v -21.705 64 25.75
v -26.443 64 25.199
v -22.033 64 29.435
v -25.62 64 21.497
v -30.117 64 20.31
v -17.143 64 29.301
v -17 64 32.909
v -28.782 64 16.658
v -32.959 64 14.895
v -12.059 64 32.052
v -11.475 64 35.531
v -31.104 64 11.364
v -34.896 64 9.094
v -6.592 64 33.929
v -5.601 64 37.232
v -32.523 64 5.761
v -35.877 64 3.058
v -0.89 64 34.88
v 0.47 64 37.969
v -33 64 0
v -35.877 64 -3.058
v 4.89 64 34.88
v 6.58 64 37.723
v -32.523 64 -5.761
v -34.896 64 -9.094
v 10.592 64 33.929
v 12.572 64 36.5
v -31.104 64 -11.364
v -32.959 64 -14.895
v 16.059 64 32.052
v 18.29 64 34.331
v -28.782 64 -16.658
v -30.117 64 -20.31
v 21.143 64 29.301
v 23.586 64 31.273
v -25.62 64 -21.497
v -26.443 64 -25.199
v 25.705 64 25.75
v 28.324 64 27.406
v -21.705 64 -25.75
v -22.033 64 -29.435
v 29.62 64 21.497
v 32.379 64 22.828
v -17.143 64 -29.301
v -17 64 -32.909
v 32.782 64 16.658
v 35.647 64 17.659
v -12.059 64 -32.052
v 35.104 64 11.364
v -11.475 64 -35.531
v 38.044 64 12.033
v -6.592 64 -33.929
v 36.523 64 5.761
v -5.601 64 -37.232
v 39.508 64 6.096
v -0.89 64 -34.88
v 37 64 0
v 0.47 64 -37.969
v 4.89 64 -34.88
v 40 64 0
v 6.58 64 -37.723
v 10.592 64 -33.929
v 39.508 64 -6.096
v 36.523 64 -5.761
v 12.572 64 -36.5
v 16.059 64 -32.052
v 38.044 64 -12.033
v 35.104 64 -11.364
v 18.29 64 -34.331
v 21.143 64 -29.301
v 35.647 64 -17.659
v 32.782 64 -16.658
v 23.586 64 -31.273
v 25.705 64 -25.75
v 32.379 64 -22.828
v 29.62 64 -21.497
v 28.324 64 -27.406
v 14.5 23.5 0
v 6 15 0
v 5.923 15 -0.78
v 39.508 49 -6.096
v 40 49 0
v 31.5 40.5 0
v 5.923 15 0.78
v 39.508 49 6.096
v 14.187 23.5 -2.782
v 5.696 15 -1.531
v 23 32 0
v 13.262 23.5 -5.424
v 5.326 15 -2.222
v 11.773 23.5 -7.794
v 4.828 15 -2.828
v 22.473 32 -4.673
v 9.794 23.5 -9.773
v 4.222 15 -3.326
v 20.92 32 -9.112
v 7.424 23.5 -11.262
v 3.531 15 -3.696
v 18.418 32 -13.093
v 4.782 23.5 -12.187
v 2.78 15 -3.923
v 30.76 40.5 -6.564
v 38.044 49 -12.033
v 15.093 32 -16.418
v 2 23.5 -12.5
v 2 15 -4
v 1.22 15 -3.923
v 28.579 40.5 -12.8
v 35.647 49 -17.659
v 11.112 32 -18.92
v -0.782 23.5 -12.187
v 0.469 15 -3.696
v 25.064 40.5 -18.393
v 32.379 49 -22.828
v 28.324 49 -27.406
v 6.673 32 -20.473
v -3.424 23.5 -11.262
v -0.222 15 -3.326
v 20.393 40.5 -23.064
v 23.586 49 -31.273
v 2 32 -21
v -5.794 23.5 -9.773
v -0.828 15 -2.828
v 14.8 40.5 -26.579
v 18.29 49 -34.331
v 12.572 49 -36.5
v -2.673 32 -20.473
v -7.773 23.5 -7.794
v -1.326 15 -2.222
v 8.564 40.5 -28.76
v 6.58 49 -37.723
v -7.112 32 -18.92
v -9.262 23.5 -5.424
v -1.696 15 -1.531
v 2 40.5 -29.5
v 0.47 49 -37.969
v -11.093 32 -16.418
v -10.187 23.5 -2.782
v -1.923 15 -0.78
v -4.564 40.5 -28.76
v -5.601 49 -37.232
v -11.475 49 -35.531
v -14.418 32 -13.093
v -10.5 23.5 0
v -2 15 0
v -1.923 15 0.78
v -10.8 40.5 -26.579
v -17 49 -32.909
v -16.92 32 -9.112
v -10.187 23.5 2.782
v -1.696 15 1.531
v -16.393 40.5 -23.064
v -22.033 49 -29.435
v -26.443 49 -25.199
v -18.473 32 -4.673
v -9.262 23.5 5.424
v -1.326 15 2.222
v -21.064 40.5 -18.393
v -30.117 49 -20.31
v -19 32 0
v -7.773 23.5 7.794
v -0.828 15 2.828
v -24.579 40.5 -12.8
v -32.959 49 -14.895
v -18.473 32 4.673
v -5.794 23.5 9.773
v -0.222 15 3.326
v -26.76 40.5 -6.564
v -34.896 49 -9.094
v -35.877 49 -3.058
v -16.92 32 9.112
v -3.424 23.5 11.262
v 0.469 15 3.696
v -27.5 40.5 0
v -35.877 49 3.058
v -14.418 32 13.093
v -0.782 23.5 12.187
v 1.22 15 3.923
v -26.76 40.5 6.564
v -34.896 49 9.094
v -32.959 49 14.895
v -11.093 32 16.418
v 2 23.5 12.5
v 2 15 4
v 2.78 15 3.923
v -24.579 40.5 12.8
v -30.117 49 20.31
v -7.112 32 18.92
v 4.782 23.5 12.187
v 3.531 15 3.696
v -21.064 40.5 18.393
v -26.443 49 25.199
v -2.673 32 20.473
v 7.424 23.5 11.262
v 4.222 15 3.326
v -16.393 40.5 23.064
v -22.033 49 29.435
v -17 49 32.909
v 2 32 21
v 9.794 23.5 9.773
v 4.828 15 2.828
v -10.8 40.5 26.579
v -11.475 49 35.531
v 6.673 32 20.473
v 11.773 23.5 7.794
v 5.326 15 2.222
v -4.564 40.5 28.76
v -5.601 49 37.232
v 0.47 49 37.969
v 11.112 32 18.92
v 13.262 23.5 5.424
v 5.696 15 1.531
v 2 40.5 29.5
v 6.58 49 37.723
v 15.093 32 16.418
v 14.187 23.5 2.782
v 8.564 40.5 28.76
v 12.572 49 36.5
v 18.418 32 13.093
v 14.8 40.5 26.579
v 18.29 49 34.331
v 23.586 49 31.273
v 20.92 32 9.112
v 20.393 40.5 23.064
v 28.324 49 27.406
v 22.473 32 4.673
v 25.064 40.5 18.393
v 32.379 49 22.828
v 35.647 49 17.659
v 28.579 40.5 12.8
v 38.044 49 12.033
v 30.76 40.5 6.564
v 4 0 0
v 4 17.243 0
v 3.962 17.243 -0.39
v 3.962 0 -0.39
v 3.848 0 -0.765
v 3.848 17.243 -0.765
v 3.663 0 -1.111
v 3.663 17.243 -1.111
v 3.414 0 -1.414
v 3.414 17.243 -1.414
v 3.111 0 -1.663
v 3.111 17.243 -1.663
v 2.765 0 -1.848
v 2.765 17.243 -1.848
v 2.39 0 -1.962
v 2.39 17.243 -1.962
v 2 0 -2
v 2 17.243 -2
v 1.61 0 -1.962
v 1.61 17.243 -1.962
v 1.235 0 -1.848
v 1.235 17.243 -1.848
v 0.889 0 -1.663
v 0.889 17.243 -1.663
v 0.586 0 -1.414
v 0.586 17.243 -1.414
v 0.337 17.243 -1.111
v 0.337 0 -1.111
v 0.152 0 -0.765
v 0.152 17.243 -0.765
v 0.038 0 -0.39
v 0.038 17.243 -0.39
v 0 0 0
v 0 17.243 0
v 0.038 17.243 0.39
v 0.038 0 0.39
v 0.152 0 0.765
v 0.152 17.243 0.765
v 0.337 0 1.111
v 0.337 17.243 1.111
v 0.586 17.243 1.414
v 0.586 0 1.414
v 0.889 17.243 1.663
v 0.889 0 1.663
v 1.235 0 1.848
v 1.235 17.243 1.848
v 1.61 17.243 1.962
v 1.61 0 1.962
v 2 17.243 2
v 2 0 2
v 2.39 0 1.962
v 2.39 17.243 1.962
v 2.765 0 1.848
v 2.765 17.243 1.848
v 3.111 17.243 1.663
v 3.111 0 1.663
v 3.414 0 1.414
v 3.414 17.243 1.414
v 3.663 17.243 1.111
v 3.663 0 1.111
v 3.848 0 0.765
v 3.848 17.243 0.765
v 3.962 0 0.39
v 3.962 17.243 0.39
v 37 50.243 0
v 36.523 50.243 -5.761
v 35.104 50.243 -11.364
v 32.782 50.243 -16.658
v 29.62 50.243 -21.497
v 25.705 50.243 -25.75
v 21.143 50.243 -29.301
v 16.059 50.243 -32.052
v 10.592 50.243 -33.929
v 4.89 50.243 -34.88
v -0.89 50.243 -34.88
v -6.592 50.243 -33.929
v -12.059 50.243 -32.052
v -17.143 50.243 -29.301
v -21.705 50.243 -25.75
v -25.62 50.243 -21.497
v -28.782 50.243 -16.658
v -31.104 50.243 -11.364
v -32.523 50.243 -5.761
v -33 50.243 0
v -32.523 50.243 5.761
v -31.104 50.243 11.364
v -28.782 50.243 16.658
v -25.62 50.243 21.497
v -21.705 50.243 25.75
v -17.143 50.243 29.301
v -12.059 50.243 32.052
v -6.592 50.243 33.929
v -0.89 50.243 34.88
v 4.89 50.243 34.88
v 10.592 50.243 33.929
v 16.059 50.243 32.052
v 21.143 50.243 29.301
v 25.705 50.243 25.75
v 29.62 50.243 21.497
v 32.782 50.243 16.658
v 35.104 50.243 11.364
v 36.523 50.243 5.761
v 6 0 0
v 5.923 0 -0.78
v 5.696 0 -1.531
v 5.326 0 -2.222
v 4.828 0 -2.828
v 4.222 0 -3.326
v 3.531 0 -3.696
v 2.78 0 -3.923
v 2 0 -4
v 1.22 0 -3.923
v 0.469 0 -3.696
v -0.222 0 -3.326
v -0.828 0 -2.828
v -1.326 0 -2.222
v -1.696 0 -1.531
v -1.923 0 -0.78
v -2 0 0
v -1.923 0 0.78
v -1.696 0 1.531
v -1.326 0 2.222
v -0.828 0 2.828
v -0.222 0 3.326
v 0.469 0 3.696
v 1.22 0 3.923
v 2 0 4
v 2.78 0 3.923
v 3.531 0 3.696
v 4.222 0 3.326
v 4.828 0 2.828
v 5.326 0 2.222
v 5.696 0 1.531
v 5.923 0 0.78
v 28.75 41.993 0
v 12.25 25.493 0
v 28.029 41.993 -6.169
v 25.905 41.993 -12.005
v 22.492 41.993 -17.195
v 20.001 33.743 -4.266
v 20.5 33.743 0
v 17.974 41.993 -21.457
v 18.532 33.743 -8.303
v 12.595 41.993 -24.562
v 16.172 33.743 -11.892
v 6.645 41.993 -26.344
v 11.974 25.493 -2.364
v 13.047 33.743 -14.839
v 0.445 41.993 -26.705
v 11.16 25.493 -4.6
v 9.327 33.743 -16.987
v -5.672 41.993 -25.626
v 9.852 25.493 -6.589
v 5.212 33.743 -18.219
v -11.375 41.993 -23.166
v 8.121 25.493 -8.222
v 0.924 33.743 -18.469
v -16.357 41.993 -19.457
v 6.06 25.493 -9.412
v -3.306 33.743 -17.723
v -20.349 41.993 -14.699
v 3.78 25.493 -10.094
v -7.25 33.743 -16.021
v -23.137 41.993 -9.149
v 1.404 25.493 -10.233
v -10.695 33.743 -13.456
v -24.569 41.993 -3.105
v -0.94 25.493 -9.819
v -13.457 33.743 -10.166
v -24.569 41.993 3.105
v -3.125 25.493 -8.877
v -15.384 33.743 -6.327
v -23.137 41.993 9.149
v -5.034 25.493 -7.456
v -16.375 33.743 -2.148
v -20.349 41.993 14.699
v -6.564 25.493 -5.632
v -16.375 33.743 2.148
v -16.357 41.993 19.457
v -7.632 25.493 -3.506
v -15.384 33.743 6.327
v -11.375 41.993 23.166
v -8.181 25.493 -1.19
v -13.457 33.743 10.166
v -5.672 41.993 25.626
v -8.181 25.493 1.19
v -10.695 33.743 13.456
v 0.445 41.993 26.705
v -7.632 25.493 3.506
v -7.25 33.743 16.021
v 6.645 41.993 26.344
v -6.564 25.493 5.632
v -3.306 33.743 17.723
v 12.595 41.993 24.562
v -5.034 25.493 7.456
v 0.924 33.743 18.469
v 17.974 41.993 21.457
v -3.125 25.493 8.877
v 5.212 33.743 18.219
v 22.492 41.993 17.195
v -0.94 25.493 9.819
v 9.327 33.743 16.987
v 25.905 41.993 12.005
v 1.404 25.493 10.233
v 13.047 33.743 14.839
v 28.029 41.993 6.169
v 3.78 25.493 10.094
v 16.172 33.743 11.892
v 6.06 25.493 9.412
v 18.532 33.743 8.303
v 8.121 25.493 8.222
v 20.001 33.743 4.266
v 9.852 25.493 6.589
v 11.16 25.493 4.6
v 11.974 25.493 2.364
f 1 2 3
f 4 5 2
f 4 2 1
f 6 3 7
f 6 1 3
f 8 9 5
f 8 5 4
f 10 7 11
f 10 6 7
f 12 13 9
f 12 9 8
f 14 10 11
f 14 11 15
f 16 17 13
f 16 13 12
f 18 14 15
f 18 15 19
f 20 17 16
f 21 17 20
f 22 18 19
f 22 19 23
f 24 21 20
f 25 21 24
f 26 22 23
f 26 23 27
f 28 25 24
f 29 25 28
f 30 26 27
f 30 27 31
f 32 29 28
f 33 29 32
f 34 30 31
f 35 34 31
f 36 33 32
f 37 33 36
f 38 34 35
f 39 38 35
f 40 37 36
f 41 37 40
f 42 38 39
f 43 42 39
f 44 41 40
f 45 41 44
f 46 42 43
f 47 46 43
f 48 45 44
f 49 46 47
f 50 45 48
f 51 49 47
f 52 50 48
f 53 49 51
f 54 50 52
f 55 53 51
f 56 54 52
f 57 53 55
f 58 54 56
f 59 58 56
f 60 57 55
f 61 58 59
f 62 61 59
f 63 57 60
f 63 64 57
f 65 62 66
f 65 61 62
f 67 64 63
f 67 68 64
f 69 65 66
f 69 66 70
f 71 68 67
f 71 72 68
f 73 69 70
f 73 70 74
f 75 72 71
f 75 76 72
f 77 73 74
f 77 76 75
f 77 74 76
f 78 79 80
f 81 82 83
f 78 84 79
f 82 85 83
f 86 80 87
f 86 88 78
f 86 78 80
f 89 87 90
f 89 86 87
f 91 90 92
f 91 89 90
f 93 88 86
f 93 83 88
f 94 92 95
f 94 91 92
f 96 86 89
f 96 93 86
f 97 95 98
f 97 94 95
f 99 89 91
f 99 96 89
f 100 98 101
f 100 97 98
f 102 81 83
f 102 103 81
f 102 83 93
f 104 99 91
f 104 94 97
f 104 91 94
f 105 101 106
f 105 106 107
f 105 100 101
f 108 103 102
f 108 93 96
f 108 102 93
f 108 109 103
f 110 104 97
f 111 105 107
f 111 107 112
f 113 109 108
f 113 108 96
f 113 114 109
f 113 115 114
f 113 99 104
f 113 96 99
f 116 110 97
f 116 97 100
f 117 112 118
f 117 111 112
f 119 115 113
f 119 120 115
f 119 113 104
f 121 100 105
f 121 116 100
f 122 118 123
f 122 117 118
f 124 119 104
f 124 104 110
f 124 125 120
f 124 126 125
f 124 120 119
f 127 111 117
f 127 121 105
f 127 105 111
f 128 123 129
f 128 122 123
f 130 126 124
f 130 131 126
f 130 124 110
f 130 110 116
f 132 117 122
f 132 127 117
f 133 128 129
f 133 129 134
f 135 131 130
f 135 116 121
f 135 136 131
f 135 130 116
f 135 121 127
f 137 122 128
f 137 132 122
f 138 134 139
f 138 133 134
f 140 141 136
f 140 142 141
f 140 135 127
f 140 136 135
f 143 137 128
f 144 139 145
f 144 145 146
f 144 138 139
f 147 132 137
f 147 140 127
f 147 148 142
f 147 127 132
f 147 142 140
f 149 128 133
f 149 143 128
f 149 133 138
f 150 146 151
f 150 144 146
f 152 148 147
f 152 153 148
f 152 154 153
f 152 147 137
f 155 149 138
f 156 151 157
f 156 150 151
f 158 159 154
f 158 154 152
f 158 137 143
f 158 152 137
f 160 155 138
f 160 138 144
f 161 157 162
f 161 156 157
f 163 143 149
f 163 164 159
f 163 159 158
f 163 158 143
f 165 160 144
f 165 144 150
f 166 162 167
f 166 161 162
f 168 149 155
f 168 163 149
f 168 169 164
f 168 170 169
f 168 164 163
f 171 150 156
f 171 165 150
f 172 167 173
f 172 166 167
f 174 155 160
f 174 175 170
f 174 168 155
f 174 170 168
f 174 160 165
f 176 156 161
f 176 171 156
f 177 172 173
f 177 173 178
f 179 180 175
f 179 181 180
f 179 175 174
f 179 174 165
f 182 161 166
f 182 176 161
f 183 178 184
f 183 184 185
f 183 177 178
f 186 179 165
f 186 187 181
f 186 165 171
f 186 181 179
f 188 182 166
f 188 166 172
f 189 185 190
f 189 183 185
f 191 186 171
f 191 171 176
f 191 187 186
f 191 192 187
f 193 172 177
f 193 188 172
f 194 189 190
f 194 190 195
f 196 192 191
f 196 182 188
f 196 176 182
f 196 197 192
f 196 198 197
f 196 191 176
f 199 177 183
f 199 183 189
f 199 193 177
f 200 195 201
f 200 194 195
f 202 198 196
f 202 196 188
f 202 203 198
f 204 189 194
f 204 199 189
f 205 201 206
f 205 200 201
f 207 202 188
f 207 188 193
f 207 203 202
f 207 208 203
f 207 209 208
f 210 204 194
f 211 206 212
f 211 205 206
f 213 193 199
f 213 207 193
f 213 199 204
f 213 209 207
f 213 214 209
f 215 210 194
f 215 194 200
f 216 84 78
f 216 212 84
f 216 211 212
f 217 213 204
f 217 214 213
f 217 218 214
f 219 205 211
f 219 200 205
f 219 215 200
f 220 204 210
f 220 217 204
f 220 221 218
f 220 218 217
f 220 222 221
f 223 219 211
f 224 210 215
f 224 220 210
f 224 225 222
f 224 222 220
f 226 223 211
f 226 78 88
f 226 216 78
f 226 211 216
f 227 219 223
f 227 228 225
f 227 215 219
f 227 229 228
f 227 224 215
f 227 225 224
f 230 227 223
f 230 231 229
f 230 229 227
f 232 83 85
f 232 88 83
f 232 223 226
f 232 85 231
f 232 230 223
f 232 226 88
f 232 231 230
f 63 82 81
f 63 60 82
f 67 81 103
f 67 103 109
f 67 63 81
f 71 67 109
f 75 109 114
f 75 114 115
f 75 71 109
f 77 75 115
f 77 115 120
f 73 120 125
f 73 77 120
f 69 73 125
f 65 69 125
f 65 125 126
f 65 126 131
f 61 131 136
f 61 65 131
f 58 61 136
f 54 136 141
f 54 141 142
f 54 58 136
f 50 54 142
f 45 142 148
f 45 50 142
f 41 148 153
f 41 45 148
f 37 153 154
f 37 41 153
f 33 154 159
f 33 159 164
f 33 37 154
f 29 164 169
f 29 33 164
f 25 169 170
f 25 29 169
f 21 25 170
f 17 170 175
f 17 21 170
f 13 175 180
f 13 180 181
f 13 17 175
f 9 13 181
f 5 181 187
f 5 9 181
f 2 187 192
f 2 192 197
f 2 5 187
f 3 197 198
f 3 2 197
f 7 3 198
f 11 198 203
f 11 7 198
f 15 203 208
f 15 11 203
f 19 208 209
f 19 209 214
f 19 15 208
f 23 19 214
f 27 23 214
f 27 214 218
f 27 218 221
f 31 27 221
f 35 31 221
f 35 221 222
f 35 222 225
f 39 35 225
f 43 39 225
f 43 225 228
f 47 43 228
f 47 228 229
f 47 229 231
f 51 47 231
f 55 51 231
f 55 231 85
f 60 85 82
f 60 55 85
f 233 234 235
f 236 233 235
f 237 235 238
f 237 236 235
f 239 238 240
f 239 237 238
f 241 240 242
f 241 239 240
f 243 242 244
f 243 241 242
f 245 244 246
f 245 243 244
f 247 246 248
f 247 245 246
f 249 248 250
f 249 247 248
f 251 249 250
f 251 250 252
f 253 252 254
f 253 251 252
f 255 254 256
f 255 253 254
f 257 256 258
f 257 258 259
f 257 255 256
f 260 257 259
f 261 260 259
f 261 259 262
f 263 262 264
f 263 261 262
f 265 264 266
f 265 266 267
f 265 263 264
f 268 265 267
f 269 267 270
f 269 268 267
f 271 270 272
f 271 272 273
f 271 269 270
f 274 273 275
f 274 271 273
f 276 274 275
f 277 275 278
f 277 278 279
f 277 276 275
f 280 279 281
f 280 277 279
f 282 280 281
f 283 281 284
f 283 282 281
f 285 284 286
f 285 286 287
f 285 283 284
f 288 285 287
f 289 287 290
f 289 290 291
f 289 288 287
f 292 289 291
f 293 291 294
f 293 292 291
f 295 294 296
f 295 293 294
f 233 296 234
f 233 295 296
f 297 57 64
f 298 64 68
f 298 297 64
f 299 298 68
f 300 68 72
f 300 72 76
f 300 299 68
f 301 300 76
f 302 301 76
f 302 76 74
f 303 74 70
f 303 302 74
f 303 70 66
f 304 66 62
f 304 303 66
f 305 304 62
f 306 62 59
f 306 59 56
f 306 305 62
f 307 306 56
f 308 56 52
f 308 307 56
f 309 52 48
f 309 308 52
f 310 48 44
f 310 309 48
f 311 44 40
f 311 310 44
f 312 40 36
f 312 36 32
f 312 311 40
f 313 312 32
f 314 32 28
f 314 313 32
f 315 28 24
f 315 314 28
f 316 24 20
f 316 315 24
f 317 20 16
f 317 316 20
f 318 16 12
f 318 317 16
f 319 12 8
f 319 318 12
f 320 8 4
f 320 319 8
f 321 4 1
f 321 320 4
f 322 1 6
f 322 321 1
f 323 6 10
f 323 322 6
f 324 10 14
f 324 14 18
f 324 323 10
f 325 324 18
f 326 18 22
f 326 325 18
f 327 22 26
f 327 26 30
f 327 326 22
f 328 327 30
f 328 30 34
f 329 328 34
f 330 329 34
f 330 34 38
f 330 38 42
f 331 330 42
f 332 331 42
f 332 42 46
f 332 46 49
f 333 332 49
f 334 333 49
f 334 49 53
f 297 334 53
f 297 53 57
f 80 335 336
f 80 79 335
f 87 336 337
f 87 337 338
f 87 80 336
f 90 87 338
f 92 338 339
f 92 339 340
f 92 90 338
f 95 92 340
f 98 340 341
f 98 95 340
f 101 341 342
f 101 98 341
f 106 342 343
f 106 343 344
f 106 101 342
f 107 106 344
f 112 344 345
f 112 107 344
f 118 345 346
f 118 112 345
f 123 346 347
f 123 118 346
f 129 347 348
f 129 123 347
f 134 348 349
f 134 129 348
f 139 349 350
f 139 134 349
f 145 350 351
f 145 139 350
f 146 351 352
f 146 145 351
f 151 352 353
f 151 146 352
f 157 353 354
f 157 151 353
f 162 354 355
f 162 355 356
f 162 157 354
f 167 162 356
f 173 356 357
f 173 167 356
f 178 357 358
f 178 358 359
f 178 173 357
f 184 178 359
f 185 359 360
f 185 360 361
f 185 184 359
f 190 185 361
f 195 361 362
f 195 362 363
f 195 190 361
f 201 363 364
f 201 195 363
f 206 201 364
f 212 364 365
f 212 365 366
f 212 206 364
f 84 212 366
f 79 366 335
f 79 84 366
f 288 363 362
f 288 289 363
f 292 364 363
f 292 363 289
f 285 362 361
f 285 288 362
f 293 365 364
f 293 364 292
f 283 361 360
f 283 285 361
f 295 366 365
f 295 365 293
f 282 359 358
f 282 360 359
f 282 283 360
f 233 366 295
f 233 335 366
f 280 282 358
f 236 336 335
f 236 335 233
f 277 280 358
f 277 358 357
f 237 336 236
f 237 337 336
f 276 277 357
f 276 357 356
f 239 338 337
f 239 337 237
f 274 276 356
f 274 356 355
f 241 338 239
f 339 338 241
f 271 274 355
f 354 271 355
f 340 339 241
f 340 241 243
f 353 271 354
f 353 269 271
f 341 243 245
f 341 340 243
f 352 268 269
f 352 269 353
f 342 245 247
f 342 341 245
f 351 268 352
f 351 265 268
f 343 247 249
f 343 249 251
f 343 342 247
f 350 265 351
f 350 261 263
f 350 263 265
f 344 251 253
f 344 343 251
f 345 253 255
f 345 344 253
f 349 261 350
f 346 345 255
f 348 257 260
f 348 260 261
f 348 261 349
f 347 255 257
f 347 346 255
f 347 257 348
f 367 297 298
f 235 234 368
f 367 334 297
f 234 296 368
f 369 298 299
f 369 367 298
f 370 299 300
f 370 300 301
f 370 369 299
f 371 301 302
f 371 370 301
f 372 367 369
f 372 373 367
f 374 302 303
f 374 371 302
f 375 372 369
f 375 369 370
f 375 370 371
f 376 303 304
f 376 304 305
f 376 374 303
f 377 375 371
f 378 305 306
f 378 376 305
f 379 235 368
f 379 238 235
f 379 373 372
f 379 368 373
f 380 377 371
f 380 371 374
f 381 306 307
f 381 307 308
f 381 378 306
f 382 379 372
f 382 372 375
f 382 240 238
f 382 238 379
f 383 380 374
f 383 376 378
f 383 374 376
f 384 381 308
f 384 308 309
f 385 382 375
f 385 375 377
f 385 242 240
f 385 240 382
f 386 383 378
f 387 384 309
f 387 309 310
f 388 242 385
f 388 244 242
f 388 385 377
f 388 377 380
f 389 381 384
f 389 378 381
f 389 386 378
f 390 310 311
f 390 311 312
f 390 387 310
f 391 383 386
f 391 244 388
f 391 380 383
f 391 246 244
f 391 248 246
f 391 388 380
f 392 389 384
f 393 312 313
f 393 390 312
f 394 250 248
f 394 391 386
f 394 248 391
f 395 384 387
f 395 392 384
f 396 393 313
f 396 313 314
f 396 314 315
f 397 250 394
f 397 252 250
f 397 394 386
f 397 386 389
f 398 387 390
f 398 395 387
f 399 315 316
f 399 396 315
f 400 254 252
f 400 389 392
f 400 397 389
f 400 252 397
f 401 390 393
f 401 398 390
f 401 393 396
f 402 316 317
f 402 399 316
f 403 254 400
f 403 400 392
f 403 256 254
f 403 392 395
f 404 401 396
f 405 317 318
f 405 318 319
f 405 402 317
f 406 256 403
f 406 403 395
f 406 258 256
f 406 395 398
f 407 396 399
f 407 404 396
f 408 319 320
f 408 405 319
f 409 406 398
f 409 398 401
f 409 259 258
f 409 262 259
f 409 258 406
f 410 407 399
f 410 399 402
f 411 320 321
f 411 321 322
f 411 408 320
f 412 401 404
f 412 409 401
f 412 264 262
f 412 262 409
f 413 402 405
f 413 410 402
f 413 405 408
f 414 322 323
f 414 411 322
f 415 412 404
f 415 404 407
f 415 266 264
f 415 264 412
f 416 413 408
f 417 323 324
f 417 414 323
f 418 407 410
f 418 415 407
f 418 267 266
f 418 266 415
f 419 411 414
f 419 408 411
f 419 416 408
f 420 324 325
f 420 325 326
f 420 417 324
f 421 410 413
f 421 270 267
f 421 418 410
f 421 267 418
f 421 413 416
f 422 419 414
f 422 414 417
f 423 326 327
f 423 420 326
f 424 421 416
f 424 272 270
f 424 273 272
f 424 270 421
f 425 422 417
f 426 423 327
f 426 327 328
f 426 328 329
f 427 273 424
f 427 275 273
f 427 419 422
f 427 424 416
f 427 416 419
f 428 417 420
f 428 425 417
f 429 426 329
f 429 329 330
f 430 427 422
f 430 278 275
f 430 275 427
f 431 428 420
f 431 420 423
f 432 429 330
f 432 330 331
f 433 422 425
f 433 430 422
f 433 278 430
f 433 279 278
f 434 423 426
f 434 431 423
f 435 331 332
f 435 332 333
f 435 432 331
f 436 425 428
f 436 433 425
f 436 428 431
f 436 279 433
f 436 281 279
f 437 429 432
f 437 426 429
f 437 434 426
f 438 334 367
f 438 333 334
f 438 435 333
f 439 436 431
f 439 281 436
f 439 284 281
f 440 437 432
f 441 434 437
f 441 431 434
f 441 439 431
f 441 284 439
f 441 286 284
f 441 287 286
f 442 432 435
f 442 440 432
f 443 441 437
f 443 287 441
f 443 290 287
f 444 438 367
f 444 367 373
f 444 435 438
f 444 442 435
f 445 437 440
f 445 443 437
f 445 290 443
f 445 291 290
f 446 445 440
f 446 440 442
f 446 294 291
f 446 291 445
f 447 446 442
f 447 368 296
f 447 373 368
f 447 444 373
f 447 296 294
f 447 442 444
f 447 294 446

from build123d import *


with BuildPart() as part:
    # basis → roteren (revolve)
    with BuildSketch(Plane.XY, mode=Mode.PRIVATE) as roteren_sk:
        Polygon((-2, 0), (-2, 15), (-36, 49), (-36, 64), (-33, 64), (-33, 50.242640687), (0, 17.242640687), (0, 0), align=None)
    revolve(roteren_sk.sketch.rotate(Axis((2, 0, 0), (0, 1, 0)), 180), axis=Axis((2, 0, 0), (0, 1, 0)))


solid = part.part
